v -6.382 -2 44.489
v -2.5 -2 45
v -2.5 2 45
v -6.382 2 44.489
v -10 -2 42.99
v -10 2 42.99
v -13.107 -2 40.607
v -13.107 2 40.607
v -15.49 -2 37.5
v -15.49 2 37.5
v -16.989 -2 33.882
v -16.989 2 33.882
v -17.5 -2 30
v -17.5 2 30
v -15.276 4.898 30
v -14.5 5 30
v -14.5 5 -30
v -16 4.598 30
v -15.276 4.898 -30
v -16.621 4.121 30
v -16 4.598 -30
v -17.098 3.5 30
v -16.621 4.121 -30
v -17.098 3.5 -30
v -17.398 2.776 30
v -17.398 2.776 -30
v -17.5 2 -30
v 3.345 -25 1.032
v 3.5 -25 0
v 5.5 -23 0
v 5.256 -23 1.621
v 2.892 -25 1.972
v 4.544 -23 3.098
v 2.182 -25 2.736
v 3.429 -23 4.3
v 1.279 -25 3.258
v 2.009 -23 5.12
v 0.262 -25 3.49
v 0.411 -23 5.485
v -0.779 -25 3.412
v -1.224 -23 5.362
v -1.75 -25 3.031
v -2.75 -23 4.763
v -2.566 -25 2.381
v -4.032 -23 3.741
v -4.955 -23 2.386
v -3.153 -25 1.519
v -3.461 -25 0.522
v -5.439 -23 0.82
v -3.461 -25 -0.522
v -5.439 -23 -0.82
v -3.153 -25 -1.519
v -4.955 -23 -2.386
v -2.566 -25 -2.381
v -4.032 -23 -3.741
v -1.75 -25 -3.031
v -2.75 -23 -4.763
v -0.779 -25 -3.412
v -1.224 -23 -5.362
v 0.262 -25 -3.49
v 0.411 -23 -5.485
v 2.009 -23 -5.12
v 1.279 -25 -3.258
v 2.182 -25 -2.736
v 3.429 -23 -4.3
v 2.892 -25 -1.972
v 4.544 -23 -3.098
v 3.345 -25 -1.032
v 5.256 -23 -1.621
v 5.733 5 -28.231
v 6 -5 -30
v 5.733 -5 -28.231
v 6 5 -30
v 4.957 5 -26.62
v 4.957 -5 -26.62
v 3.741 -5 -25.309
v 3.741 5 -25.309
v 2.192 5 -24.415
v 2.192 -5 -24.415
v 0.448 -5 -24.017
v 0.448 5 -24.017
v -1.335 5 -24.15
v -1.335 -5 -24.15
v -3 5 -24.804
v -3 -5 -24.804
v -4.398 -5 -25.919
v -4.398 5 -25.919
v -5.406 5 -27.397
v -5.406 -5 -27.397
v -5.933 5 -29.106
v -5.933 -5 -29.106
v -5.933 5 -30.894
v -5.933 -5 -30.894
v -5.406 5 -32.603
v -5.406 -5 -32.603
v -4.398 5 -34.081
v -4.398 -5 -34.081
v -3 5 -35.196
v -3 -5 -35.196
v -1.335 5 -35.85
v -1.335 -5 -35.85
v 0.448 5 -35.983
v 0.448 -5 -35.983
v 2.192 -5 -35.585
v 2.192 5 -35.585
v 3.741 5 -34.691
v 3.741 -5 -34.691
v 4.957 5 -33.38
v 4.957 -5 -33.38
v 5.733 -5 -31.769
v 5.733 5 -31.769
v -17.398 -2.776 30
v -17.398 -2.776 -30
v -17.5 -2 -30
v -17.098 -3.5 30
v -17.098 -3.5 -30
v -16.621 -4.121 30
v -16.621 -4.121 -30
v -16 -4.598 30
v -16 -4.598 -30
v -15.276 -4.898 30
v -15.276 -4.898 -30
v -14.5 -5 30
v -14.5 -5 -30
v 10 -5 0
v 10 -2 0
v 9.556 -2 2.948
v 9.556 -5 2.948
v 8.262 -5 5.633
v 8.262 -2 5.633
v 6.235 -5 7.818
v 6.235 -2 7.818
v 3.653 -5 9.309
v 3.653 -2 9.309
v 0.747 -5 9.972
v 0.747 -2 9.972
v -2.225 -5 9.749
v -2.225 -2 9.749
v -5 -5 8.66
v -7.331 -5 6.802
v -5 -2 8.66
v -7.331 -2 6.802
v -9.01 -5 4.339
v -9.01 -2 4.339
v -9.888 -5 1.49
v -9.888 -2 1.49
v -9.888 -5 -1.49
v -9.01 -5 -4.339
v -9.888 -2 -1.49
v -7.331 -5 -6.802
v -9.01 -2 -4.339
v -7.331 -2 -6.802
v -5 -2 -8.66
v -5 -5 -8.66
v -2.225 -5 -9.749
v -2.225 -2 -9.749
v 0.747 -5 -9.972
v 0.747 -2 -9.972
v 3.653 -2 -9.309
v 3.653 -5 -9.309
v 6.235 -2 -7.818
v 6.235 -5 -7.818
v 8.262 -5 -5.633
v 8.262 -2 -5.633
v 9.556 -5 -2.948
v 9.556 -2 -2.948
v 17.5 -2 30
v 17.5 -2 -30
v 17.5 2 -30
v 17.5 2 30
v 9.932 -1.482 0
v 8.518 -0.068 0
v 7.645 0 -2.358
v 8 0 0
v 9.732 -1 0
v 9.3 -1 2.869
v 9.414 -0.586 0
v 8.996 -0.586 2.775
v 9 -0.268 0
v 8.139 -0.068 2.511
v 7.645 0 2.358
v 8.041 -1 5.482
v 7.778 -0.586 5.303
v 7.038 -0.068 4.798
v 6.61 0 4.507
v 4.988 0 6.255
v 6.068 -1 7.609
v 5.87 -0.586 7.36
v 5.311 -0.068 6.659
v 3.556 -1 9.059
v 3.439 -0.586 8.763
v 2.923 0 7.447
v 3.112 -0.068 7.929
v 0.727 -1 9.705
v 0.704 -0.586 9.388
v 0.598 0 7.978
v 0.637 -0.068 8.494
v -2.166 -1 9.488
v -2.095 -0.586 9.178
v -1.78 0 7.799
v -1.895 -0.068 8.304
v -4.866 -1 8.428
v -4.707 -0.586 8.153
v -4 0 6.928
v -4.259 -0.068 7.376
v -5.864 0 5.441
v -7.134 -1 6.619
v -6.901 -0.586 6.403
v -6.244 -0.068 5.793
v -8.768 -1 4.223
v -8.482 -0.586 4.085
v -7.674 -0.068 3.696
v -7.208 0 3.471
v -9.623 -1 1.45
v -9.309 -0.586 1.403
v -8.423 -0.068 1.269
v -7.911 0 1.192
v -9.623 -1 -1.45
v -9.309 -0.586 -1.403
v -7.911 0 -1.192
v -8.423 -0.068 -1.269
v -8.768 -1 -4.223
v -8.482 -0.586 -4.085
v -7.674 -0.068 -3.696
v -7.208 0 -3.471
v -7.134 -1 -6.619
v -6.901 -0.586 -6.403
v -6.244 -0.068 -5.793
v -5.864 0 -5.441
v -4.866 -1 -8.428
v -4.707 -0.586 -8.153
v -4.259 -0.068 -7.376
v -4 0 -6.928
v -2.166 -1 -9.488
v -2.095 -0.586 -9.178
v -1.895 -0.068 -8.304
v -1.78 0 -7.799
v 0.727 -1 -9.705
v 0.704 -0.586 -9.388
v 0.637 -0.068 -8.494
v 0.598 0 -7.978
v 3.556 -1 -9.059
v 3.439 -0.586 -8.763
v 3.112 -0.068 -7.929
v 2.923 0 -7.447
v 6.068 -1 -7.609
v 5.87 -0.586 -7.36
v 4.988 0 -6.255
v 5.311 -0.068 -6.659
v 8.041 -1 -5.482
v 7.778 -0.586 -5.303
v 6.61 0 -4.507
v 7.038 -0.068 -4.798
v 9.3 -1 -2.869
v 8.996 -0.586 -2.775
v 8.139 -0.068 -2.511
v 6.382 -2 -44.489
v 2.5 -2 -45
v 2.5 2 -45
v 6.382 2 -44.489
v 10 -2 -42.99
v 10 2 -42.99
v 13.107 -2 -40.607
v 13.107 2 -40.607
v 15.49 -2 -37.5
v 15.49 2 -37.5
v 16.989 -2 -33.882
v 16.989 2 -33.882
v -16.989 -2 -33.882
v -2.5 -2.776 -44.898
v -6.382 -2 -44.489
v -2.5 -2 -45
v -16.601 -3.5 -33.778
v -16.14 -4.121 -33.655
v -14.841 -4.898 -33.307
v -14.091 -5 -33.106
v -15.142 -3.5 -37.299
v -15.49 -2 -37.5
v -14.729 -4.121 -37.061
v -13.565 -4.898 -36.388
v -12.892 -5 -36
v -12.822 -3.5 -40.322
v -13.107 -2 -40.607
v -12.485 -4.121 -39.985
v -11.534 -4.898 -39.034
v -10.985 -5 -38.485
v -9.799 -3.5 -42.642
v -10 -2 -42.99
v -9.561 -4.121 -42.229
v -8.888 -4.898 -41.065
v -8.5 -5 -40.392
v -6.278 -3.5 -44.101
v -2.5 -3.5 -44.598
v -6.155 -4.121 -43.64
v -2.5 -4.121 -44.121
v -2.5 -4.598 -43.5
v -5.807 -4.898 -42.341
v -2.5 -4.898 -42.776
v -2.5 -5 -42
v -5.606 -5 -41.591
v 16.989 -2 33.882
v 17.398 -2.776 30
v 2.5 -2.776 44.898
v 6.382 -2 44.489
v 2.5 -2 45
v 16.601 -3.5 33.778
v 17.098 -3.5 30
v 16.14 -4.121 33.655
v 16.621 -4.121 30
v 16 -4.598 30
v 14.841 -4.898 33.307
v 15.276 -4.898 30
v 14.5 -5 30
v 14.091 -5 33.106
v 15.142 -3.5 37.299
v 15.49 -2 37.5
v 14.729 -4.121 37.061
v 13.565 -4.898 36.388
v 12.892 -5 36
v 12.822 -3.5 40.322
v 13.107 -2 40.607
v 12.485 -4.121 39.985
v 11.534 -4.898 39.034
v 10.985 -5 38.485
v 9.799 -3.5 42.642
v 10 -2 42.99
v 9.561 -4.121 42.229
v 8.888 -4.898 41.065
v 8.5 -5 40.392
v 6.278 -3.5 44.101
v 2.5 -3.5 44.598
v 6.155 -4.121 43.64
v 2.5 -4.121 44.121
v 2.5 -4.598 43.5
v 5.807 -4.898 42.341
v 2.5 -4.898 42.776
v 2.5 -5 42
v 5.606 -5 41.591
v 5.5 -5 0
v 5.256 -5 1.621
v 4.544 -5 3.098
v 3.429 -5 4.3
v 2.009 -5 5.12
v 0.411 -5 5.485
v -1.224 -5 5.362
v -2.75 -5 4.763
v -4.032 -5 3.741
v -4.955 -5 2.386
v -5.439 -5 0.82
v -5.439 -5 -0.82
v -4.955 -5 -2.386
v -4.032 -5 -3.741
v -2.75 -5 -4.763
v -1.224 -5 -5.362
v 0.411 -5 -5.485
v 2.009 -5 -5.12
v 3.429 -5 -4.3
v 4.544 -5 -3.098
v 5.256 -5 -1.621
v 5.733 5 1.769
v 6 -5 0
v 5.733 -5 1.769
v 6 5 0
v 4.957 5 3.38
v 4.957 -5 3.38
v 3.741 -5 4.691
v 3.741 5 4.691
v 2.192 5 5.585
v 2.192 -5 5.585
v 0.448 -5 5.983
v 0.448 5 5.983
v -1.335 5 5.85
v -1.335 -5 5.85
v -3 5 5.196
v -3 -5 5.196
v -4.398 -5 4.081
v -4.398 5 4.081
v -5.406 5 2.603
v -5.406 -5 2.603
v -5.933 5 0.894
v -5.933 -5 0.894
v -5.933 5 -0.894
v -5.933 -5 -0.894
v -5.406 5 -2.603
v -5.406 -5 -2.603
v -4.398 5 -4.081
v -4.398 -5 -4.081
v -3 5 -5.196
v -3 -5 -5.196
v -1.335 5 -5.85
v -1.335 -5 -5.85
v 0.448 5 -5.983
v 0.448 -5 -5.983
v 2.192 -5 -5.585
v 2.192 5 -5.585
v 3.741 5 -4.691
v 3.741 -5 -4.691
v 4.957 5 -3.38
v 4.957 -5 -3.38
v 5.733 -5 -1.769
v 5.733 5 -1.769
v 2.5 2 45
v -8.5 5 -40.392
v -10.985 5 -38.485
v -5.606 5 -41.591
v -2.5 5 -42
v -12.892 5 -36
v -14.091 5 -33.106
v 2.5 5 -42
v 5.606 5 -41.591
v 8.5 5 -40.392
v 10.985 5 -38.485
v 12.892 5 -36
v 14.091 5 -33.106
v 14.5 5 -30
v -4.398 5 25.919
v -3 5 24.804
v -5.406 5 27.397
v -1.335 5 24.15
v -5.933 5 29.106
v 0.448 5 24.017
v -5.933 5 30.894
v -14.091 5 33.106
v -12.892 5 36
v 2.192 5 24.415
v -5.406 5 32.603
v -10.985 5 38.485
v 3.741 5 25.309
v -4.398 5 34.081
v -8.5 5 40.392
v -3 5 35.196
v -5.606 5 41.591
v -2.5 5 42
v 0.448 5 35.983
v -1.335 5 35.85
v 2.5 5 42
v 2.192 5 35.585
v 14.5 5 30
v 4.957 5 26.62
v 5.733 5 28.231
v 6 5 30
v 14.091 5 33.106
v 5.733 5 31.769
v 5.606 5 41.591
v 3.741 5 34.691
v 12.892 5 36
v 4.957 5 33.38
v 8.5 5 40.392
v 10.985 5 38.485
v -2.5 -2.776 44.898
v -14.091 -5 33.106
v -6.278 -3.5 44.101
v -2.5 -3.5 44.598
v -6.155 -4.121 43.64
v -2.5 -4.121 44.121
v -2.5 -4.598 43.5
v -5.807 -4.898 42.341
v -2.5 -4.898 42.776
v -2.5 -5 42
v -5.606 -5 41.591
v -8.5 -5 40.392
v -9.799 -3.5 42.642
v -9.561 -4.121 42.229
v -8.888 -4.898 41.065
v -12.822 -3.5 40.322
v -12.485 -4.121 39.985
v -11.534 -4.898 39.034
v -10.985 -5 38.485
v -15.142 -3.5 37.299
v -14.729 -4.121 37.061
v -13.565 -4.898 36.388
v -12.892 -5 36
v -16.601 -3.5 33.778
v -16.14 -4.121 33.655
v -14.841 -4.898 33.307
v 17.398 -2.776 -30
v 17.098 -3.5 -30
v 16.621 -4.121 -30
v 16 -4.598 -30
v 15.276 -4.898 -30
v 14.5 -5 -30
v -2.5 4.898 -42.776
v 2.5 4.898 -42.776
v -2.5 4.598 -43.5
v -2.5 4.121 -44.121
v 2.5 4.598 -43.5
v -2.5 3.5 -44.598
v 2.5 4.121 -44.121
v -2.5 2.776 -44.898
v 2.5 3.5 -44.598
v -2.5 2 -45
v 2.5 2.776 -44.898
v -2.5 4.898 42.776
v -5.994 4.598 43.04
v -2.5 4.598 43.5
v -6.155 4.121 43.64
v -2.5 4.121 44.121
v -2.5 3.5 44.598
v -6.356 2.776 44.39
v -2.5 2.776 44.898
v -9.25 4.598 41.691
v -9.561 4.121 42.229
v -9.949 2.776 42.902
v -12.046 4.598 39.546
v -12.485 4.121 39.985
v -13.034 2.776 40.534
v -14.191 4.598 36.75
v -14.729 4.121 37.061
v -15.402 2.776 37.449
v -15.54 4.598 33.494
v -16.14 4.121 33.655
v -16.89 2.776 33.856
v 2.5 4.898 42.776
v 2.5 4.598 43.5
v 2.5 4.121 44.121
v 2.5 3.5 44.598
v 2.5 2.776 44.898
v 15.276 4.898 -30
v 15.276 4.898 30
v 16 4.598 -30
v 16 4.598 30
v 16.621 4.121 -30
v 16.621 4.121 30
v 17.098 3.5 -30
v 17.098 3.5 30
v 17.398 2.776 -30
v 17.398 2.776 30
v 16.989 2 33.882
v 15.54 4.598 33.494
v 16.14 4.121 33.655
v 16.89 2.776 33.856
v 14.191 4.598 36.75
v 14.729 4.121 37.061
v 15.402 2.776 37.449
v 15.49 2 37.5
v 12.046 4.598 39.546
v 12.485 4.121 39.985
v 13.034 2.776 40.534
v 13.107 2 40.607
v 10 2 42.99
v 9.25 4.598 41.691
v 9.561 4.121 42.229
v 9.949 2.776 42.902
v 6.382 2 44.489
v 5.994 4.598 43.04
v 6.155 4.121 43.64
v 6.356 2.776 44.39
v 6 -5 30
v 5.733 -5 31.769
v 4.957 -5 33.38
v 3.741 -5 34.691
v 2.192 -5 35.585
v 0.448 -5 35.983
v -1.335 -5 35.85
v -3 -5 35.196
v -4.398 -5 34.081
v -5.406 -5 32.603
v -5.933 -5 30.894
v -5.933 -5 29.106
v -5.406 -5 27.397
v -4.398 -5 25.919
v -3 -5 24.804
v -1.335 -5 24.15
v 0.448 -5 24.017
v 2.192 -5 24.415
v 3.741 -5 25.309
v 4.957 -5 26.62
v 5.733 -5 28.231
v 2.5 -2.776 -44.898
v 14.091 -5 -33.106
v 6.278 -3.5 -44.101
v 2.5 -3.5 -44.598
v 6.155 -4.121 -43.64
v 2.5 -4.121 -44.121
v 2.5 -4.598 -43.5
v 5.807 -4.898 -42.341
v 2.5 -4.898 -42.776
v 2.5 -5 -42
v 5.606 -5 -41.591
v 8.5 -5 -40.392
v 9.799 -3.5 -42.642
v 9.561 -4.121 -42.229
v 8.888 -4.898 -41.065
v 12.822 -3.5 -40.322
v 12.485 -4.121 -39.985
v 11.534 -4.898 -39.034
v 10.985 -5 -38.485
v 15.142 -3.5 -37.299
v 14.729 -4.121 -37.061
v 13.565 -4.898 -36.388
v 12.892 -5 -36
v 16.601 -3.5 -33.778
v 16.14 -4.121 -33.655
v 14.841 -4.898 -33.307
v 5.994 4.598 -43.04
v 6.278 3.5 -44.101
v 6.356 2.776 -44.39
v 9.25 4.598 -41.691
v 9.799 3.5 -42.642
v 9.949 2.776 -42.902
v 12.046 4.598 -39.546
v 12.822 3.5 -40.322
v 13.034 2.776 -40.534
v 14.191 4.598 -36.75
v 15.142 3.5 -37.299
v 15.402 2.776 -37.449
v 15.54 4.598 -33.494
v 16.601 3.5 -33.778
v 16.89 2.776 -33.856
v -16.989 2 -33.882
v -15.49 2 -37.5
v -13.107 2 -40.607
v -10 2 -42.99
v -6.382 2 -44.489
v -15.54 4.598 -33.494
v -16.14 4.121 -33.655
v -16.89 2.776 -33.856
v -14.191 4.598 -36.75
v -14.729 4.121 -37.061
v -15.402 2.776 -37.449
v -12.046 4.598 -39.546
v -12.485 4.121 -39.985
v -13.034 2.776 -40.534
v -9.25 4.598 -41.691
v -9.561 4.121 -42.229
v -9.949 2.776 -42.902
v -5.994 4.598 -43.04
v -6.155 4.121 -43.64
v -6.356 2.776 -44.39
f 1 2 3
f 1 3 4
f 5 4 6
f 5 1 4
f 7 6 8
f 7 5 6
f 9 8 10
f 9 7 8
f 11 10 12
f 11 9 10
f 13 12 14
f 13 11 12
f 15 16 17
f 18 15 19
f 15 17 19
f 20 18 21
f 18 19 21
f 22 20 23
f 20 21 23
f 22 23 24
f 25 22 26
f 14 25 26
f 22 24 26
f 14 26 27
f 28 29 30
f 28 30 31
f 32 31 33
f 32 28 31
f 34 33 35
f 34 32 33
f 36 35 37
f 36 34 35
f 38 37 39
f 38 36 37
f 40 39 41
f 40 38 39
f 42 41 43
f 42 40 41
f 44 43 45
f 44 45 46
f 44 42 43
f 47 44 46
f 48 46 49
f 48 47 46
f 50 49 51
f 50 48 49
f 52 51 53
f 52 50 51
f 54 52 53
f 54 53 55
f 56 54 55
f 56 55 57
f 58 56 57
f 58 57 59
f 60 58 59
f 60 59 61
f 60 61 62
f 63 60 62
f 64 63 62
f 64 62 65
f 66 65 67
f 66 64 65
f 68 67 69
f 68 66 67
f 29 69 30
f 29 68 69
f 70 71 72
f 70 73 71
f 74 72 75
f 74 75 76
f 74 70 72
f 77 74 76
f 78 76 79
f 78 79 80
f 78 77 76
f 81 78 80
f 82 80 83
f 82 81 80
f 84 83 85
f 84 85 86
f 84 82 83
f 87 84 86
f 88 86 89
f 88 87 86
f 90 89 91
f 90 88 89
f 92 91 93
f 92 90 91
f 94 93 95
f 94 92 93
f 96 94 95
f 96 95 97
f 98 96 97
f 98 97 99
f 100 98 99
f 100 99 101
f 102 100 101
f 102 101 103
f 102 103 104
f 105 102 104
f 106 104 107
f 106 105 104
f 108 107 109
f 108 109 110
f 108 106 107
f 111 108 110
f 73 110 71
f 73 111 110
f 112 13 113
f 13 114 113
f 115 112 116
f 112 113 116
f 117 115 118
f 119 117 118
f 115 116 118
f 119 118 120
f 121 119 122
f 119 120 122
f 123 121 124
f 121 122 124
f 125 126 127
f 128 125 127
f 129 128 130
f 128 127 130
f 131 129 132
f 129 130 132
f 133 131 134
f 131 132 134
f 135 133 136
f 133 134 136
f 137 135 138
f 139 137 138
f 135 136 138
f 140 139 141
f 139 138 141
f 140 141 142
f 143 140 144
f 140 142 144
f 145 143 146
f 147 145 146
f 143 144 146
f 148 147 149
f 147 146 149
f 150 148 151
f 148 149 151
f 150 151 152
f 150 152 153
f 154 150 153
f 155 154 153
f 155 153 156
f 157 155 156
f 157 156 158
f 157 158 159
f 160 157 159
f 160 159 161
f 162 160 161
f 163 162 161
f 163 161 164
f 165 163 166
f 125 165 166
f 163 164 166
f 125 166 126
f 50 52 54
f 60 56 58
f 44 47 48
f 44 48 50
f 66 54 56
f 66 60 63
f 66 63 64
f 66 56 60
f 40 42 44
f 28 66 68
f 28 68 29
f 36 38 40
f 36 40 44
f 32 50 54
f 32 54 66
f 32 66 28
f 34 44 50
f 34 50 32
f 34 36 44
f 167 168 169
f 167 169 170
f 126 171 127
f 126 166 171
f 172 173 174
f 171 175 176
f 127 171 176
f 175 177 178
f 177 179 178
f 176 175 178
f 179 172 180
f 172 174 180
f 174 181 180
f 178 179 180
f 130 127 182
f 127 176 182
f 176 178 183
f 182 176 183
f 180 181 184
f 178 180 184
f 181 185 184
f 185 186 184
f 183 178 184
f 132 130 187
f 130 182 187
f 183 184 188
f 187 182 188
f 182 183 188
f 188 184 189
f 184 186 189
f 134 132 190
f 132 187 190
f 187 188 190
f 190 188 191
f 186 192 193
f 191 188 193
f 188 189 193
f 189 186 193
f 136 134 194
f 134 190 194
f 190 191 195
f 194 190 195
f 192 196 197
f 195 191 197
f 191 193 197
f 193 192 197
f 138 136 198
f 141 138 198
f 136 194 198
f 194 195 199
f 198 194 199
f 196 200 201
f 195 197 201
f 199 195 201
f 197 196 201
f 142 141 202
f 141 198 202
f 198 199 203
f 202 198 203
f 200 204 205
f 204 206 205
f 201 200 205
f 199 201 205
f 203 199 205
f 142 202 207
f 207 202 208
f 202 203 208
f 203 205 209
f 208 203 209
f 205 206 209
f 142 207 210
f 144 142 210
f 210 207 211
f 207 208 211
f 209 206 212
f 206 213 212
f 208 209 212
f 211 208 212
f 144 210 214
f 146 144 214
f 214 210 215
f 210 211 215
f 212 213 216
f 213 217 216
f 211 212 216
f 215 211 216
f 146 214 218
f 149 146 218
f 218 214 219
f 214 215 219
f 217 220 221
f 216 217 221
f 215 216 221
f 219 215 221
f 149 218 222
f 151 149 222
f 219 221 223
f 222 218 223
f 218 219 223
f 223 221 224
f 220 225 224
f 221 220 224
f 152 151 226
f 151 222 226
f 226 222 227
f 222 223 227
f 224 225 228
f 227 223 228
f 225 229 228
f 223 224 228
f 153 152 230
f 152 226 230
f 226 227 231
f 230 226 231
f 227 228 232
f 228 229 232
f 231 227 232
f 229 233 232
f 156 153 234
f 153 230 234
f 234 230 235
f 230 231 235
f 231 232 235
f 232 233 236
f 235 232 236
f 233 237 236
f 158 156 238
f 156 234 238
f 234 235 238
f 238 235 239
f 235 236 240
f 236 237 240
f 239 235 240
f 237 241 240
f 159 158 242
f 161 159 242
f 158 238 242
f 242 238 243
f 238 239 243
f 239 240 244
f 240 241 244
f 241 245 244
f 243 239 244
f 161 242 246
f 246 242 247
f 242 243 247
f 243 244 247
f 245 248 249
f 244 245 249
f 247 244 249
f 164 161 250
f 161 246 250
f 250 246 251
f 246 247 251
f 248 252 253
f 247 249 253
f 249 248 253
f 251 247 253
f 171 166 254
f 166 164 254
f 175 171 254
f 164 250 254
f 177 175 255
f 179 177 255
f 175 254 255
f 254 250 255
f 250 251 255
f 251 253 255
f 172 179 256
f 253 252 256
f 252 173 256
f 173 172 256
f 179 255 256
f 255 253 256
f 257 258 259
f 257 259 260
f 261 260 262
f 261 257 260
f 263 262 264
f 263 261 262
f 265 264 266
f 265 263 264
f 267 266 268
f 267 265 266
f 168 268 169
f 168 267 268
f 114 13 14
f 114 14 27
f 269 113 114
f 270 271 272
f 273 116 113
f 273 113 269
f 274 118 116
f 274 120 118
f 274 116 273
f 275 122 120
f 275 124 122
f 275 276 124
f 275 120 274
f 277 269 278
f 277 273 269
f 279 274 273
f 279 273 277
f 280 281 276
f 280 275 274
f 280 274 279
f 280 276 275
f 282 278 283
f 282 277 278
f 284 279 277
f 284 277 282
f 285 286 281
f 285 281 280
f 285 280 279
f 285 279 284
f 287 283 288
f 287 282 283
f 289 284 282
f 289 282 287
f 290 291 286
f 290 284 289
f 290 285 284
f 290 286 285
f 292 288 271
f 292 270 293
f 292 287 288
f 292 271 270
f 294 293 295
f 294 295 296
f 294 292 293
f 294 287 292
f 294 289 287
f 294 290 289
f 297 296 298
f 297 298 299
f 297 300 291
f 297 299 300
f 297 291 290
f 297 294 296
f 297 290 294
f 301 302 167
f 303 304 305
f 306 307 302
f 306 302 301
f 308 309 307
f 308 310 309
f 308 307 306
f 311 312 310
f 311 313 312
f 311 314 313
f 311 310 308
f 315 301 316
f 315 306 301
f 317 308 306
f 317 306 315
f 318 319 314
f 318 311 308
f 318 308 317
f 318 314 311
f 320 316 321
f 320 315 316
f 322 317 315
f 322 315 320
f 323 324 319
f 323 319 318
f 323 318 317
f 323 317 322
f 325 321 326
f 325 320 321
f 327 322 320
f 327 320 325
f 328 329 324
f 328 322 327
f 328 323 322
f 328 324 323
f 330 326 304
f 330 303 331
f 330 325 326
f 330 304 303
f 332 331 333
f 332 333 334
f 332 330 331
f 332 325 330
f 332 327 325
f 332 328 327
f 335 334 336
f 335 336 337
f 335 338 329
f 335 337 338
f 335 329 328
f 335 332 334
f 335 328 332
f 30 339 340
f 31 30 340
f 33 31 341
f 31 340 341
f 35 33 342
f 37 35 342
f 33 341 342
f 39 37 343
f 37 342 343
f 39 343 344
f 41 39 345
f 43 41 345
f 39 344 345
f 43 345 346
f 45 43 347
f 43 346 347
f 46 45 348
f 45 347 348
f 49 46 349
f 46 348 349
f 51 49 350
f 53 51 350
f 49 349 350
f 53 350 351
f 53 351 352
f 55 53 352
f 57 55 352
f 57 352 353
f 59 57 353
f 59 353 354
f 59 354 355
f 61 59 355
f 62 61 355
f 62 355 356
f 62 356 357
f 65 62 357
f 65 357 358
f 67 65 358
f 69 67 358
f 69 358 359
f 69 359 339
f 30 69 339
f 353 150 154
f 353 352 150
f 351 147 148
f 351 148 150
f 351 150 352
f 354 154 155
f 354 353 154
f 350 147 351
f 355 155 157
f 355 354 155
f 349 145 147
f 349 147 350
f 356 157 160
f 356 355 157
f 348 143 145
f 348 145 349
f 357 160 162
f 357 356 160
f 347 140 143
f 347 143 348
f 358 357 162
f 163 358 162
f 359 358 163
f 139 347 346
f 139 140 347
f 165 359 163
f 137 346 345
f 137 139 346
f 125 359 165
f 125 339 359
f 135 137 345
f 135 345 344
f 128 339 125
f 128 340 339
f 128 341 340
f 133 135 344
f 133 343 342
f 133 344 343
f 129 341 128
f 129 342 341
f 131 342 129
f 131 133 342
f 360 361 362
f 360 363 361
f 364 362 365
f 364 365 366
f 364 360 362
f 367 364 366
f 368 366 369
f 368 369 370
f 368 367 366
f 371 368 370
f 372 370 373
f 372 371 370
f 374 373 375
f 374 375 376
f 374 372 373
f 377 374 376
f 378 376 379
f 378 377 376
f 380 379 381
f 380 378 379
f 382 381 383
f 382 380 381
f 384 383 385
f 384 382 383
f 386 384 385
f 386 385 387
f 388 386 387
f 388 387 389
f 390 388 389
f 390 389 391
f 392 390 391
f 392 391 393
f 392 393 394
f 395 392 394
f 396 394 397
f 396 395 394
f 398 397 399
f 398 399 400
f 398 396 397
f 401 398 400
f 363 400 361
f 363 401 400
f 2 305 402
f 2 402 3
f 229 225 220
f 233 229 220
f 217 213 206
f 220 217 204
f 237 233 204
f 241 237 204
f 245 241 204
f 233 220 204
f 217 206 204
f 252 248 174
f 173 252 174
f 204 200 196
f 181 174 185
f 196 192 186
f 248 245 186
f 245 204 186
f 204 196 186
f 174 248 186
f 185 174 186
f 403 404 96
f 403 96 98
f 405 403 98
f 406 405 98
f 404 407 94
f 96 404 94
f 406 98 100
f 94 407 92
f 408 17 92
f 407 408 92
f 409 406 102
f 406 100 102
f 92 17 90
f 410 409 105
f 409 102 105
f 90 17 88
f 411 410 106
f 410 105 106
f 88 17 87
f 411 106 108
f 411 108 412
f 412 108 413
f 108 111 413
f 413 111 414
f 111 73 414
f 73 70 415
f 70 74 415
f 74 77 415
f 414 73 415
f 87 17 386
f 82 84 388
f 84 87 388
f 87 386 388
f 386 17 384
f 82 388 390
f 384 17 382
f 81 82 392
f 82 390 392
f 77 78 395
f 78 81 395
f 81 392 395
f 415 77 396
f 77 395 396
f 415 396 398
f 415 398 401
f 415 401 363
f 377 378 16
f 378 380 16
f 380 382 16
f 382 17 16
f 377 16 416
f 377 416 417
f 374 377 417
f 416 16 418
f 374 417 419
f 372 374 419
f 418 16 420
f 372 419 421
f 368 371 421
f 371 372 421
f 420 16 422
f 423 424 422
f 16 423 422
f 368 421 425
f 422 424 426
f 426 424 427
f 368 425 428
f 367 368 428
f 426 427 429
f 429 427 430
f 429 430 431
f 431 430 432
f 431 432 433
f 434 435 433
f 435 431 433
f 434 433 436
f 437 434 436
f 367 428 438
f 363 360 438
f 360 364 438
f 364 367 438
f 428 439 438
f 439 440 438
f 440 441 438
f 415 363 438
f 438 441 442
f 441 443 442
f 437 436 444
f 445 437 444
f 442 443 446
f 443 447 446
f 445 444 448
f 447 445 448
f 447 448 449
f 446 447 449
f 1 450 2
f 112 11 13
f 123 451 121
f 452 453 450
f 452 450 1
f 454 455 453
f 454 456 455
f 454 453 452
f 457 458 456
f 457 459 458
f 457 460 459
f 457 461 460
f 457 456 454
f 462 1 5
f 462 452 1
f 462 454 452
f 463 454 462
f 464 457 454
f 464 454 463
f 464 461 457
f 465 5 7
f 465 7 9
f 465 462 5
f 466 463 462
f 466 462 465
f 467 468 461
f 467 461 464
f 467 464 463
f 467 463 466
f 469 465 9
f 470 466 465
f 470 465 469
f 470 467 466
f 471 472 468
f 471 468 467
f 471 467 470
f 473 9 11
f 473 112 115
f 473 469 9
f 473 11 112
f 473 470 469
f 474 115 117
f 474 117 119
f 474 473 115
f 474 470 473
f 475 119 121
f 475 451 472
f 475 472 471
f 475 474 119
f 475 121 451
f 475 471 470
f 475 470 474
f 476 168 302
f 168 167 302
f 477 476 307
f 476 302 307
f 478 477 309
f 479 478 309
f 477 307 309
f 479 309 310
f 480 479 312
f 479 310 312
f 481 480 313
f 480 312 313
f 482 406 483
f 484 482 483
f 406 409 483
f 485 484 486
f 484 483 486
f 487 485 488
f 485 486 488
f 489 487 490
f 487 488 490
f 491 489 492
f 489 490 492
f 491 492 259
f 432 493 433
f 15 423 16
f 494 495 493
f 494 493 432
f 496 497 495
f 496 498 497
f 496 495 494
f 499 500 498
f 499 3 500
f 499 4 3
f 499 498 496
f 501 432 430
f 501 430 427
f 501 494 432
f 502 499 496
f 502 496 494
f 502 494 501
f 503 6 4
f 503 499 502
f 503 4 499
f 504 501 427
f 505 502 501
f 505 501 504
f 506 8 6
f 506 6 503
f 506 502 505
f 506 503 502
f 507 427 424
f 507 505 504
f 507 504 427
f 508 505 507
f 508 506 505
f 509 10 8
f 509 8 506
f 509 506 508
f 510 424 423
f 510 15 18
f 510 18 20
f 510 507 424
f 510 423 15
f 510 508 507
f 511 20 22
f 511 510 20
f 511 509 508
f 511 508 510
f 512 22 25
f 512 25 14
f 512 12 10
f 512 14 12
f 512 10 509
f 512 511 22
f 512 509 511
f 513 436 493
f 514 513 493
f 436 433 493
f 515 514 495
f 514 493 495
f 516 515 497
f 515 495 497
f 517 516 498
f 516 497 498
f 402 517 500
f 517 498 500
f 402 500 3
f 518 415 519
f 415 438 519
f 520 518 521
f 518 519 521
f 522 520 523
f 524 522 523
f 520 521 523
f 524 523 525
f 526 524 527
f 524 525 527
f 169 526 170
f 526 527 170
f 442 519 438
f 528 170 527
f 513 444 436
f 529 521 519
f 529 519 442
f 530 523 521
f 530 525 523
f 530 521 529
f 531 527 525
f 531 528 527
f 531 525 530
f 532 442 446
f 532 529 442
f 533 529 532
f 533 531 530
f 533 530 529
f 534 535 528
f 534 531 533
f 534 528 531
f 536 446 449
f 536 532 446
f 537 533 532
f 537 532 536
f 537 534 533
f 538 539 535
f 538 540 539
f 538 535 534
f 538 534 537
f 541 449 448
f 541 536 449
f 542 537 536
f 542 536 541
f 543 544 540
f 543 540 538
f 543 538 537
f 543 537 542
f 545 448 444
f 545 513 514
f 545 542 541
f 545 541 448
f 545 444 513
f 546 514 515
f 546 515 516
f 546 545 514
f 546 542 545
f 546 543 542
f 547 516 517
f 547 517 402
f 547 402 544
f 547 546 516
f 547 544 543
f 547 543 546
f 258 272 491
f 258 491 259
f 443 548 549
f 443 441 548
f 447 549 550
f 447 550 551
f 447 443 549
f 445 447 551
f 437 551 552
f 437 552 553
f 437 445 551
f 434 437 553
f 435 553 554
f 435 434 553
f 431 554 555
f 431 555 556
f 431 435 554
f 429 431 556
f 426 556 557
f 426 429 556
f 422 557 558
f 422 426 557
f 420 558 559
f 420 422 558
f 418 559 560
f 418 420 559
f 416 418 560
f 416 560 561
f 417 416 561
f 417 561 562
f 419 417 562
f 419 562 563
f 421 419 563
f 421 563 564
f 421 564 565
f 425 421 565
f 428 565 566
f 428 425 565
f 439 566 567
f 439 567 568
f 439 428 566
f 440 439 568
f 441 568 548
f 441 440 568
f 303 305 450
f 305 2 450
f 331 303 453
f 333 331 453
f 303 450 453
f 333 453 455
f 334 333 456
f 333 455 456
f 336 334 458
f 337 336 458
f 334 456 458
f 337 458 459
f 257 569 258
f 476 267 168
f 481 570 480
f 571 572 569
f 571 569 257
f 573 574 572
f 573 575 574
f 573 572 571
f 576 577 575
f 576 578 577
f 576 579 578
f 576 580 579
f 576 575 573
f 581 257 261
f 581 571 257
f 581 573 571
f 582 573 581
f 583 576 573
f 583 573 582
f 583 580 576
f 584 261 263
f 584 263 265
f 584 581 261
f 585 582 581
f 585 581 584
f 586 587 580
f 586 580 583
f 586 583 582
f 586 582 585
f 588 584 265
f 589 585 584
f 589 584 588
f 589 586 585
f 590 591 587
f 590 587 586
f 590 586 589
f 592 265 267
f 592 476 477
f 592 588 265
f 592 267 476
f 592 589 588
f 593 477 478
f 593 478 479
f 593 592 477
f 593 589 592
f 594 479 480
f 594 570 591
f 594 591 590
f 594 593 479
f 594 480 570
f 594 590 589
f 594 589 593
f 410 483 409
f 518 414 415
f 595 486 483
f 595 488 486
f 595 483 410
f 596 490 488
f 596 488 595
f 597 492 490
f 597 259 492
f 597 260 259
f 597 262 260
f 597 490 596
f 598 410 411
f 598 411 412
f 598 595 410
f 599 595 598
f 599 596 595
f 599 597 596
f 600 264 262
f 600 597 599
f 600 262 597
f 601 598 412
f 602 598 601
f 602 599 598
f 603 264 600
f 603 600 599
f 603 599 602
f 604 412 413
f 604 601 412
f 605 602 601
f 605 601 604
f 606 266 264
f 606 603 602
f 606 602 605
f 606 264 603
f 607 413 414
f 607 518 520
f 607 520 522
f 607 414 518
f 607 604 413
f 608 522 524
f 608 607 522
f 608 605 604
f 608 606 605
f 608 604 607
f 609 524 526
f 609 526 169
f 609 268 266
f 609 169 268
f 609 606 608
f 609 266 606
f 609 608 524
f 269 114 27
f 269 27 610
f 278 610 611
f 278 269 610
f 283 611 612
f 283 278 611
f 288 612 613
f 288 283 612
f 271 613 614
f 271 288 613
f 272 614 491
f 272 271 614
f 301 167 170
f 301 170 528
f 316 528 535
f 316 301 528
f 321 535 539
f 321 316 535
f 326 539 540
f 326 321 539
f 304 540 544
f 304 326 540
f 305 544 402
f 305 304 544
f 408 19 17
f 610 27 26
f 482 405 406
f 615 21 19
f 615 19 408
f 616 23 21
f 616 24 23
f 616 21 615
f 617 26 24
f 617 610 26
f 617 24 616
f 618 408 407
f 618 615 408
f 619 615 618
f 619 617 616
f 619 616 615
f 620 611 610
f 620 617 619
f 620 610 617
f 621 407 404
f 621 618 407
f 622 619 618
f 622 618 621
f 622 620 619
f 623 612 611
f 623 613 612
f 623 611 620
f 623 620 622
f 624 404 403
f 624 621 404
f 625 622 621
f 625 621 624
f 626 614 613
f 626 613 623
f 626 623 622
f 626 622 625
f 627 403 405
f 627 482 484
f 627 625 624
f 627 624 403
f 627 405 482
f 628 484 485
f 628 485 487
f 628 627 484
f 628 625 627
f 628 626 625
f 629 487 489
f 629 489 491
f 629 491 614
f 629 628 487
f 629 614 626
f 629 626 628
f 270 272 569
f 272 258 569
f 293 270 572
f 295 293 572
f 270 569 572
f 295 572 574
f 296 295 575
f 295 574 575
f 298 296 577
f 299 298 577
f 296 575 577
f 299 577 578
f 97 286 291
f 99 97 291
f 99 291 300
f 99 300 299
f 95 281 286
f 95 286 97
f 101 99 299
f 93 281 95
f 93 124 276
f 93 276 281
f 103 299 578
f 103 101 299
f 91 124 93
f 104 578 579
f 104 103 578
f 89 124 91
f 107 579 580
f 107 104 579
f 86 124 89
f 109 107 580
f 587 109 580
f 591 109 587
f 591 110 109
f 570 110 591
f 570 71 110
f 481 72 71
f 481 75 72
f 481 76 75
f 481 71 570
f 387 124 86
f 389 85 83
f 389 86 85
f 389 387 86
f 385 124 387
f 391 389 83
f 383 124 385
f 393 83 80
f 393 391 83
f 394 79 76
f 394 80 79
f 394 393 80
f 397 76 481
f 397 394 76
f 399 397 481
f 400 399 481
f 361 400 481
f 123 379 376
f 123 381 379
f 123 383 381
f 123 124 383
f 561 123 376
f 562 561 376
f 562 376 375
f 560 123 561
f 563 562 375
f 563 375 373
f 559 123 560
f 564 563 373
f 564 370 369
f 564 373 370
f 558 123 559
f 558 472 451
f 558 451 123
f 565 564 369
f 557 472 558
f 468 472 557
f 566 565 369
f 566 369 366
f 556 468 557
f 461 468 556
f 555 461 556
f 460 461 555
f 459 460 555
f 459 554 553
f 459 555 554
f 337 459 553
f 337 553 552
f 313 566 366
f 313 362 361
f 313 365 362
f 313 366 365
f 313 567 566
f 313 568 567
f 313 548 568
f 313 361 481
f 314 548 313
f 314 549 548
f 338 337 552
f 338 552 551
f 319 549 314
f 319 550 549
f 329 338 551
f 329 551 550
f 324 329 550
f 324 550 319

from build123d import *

# Parameters (mm, degrees)
F0_R     = 6
F1_DEPTH = 5
F2_R     = 3
F3_R     = 3
F4_R     = 10
F4_R_2   = 5.5
F5_DEPTH = 5
F6_DEPTH = 25
F7_SIZE  = 2
F8_R     = 2


with BuildPart() as f1:
    # F0 (on Front) → F1 (new body, symmetric)
    with BuildSketch(Plane.XZ):
        with BuildLine():
            ThreePointArc((17.5, 30), (13.106602, 40.606602), (2.5, 45))
            Line((2.5, 45), (-2.5, 45))
            ThreePointArc((-2.5, 45), (-13.106602, 40.606602), (-17.5, 30))
            Line((-17.5, 30), (-17.5, -30))
            ThreePointArc((-17.5, -30), (-13.106602, -40.606602), (-2.5, -45))
            Line((-2.5, -45), (2.5, -45))
            ThreePointArc((2.5, -45), (13.106602, -40.606602), (17.5, -30))
            Line((17.5, -30), (17.5, 30))
        make_face()
        with Locations((0, -30)):
            Circle(F0_R, mode=Mode.SUBTRACT)
        Circle(F0_R, mode=Mode.SUBTRACT)
        with Locations((0, 30)):
            Circle(F0_R, mode=Mode.SUBTRACT)
    extrude(amount=F1_DEPTH, both=True)

    # F2
    f2_edges = [f1.edges().sort_by_distance(p)[0] for p in [
        (17.5, -5, 0),
    ]]
    fillet(f2_edges, radius=F2_R)

    # F3
    f3_edges = [f1.edges().sort_by_distance(p)[0] for p in [
        (17.5, 5, 0),
    ]]
    fillet(f3_edges, radius=F3_R)


with BuildPart() as f5:
    # F4 (on Front) → F5 (new body)
    with BuildSketch(Plane.XZ):
        Circle(F4_R)
        Circle(F4_R_2, mode=Mode.SUBTRACT)
    extrude(amount=F5_DEPTH)

    # F4 (on Front) → F6 (join)
    with BuildSketch(Plane.XZ):
        Circle(F4_R_2)
    extrude(amount=F6_DEPTH)

    # F7
    f7_edges = [f5.edges().sort_by_distance(p)[0] for p in [
        (-5.5, -25, 0),
    ]]
    chamfer(f7_edges, length=F7_SIZE)

    # F8
    f8_edges = [f5.edges().sort_by_distance(p)[0] for p in [
        (-10, 0, 0),
    ]]
    fillet(f8_edges, radius=F8_R)


solid = Compound([f1.part, f5.part])
